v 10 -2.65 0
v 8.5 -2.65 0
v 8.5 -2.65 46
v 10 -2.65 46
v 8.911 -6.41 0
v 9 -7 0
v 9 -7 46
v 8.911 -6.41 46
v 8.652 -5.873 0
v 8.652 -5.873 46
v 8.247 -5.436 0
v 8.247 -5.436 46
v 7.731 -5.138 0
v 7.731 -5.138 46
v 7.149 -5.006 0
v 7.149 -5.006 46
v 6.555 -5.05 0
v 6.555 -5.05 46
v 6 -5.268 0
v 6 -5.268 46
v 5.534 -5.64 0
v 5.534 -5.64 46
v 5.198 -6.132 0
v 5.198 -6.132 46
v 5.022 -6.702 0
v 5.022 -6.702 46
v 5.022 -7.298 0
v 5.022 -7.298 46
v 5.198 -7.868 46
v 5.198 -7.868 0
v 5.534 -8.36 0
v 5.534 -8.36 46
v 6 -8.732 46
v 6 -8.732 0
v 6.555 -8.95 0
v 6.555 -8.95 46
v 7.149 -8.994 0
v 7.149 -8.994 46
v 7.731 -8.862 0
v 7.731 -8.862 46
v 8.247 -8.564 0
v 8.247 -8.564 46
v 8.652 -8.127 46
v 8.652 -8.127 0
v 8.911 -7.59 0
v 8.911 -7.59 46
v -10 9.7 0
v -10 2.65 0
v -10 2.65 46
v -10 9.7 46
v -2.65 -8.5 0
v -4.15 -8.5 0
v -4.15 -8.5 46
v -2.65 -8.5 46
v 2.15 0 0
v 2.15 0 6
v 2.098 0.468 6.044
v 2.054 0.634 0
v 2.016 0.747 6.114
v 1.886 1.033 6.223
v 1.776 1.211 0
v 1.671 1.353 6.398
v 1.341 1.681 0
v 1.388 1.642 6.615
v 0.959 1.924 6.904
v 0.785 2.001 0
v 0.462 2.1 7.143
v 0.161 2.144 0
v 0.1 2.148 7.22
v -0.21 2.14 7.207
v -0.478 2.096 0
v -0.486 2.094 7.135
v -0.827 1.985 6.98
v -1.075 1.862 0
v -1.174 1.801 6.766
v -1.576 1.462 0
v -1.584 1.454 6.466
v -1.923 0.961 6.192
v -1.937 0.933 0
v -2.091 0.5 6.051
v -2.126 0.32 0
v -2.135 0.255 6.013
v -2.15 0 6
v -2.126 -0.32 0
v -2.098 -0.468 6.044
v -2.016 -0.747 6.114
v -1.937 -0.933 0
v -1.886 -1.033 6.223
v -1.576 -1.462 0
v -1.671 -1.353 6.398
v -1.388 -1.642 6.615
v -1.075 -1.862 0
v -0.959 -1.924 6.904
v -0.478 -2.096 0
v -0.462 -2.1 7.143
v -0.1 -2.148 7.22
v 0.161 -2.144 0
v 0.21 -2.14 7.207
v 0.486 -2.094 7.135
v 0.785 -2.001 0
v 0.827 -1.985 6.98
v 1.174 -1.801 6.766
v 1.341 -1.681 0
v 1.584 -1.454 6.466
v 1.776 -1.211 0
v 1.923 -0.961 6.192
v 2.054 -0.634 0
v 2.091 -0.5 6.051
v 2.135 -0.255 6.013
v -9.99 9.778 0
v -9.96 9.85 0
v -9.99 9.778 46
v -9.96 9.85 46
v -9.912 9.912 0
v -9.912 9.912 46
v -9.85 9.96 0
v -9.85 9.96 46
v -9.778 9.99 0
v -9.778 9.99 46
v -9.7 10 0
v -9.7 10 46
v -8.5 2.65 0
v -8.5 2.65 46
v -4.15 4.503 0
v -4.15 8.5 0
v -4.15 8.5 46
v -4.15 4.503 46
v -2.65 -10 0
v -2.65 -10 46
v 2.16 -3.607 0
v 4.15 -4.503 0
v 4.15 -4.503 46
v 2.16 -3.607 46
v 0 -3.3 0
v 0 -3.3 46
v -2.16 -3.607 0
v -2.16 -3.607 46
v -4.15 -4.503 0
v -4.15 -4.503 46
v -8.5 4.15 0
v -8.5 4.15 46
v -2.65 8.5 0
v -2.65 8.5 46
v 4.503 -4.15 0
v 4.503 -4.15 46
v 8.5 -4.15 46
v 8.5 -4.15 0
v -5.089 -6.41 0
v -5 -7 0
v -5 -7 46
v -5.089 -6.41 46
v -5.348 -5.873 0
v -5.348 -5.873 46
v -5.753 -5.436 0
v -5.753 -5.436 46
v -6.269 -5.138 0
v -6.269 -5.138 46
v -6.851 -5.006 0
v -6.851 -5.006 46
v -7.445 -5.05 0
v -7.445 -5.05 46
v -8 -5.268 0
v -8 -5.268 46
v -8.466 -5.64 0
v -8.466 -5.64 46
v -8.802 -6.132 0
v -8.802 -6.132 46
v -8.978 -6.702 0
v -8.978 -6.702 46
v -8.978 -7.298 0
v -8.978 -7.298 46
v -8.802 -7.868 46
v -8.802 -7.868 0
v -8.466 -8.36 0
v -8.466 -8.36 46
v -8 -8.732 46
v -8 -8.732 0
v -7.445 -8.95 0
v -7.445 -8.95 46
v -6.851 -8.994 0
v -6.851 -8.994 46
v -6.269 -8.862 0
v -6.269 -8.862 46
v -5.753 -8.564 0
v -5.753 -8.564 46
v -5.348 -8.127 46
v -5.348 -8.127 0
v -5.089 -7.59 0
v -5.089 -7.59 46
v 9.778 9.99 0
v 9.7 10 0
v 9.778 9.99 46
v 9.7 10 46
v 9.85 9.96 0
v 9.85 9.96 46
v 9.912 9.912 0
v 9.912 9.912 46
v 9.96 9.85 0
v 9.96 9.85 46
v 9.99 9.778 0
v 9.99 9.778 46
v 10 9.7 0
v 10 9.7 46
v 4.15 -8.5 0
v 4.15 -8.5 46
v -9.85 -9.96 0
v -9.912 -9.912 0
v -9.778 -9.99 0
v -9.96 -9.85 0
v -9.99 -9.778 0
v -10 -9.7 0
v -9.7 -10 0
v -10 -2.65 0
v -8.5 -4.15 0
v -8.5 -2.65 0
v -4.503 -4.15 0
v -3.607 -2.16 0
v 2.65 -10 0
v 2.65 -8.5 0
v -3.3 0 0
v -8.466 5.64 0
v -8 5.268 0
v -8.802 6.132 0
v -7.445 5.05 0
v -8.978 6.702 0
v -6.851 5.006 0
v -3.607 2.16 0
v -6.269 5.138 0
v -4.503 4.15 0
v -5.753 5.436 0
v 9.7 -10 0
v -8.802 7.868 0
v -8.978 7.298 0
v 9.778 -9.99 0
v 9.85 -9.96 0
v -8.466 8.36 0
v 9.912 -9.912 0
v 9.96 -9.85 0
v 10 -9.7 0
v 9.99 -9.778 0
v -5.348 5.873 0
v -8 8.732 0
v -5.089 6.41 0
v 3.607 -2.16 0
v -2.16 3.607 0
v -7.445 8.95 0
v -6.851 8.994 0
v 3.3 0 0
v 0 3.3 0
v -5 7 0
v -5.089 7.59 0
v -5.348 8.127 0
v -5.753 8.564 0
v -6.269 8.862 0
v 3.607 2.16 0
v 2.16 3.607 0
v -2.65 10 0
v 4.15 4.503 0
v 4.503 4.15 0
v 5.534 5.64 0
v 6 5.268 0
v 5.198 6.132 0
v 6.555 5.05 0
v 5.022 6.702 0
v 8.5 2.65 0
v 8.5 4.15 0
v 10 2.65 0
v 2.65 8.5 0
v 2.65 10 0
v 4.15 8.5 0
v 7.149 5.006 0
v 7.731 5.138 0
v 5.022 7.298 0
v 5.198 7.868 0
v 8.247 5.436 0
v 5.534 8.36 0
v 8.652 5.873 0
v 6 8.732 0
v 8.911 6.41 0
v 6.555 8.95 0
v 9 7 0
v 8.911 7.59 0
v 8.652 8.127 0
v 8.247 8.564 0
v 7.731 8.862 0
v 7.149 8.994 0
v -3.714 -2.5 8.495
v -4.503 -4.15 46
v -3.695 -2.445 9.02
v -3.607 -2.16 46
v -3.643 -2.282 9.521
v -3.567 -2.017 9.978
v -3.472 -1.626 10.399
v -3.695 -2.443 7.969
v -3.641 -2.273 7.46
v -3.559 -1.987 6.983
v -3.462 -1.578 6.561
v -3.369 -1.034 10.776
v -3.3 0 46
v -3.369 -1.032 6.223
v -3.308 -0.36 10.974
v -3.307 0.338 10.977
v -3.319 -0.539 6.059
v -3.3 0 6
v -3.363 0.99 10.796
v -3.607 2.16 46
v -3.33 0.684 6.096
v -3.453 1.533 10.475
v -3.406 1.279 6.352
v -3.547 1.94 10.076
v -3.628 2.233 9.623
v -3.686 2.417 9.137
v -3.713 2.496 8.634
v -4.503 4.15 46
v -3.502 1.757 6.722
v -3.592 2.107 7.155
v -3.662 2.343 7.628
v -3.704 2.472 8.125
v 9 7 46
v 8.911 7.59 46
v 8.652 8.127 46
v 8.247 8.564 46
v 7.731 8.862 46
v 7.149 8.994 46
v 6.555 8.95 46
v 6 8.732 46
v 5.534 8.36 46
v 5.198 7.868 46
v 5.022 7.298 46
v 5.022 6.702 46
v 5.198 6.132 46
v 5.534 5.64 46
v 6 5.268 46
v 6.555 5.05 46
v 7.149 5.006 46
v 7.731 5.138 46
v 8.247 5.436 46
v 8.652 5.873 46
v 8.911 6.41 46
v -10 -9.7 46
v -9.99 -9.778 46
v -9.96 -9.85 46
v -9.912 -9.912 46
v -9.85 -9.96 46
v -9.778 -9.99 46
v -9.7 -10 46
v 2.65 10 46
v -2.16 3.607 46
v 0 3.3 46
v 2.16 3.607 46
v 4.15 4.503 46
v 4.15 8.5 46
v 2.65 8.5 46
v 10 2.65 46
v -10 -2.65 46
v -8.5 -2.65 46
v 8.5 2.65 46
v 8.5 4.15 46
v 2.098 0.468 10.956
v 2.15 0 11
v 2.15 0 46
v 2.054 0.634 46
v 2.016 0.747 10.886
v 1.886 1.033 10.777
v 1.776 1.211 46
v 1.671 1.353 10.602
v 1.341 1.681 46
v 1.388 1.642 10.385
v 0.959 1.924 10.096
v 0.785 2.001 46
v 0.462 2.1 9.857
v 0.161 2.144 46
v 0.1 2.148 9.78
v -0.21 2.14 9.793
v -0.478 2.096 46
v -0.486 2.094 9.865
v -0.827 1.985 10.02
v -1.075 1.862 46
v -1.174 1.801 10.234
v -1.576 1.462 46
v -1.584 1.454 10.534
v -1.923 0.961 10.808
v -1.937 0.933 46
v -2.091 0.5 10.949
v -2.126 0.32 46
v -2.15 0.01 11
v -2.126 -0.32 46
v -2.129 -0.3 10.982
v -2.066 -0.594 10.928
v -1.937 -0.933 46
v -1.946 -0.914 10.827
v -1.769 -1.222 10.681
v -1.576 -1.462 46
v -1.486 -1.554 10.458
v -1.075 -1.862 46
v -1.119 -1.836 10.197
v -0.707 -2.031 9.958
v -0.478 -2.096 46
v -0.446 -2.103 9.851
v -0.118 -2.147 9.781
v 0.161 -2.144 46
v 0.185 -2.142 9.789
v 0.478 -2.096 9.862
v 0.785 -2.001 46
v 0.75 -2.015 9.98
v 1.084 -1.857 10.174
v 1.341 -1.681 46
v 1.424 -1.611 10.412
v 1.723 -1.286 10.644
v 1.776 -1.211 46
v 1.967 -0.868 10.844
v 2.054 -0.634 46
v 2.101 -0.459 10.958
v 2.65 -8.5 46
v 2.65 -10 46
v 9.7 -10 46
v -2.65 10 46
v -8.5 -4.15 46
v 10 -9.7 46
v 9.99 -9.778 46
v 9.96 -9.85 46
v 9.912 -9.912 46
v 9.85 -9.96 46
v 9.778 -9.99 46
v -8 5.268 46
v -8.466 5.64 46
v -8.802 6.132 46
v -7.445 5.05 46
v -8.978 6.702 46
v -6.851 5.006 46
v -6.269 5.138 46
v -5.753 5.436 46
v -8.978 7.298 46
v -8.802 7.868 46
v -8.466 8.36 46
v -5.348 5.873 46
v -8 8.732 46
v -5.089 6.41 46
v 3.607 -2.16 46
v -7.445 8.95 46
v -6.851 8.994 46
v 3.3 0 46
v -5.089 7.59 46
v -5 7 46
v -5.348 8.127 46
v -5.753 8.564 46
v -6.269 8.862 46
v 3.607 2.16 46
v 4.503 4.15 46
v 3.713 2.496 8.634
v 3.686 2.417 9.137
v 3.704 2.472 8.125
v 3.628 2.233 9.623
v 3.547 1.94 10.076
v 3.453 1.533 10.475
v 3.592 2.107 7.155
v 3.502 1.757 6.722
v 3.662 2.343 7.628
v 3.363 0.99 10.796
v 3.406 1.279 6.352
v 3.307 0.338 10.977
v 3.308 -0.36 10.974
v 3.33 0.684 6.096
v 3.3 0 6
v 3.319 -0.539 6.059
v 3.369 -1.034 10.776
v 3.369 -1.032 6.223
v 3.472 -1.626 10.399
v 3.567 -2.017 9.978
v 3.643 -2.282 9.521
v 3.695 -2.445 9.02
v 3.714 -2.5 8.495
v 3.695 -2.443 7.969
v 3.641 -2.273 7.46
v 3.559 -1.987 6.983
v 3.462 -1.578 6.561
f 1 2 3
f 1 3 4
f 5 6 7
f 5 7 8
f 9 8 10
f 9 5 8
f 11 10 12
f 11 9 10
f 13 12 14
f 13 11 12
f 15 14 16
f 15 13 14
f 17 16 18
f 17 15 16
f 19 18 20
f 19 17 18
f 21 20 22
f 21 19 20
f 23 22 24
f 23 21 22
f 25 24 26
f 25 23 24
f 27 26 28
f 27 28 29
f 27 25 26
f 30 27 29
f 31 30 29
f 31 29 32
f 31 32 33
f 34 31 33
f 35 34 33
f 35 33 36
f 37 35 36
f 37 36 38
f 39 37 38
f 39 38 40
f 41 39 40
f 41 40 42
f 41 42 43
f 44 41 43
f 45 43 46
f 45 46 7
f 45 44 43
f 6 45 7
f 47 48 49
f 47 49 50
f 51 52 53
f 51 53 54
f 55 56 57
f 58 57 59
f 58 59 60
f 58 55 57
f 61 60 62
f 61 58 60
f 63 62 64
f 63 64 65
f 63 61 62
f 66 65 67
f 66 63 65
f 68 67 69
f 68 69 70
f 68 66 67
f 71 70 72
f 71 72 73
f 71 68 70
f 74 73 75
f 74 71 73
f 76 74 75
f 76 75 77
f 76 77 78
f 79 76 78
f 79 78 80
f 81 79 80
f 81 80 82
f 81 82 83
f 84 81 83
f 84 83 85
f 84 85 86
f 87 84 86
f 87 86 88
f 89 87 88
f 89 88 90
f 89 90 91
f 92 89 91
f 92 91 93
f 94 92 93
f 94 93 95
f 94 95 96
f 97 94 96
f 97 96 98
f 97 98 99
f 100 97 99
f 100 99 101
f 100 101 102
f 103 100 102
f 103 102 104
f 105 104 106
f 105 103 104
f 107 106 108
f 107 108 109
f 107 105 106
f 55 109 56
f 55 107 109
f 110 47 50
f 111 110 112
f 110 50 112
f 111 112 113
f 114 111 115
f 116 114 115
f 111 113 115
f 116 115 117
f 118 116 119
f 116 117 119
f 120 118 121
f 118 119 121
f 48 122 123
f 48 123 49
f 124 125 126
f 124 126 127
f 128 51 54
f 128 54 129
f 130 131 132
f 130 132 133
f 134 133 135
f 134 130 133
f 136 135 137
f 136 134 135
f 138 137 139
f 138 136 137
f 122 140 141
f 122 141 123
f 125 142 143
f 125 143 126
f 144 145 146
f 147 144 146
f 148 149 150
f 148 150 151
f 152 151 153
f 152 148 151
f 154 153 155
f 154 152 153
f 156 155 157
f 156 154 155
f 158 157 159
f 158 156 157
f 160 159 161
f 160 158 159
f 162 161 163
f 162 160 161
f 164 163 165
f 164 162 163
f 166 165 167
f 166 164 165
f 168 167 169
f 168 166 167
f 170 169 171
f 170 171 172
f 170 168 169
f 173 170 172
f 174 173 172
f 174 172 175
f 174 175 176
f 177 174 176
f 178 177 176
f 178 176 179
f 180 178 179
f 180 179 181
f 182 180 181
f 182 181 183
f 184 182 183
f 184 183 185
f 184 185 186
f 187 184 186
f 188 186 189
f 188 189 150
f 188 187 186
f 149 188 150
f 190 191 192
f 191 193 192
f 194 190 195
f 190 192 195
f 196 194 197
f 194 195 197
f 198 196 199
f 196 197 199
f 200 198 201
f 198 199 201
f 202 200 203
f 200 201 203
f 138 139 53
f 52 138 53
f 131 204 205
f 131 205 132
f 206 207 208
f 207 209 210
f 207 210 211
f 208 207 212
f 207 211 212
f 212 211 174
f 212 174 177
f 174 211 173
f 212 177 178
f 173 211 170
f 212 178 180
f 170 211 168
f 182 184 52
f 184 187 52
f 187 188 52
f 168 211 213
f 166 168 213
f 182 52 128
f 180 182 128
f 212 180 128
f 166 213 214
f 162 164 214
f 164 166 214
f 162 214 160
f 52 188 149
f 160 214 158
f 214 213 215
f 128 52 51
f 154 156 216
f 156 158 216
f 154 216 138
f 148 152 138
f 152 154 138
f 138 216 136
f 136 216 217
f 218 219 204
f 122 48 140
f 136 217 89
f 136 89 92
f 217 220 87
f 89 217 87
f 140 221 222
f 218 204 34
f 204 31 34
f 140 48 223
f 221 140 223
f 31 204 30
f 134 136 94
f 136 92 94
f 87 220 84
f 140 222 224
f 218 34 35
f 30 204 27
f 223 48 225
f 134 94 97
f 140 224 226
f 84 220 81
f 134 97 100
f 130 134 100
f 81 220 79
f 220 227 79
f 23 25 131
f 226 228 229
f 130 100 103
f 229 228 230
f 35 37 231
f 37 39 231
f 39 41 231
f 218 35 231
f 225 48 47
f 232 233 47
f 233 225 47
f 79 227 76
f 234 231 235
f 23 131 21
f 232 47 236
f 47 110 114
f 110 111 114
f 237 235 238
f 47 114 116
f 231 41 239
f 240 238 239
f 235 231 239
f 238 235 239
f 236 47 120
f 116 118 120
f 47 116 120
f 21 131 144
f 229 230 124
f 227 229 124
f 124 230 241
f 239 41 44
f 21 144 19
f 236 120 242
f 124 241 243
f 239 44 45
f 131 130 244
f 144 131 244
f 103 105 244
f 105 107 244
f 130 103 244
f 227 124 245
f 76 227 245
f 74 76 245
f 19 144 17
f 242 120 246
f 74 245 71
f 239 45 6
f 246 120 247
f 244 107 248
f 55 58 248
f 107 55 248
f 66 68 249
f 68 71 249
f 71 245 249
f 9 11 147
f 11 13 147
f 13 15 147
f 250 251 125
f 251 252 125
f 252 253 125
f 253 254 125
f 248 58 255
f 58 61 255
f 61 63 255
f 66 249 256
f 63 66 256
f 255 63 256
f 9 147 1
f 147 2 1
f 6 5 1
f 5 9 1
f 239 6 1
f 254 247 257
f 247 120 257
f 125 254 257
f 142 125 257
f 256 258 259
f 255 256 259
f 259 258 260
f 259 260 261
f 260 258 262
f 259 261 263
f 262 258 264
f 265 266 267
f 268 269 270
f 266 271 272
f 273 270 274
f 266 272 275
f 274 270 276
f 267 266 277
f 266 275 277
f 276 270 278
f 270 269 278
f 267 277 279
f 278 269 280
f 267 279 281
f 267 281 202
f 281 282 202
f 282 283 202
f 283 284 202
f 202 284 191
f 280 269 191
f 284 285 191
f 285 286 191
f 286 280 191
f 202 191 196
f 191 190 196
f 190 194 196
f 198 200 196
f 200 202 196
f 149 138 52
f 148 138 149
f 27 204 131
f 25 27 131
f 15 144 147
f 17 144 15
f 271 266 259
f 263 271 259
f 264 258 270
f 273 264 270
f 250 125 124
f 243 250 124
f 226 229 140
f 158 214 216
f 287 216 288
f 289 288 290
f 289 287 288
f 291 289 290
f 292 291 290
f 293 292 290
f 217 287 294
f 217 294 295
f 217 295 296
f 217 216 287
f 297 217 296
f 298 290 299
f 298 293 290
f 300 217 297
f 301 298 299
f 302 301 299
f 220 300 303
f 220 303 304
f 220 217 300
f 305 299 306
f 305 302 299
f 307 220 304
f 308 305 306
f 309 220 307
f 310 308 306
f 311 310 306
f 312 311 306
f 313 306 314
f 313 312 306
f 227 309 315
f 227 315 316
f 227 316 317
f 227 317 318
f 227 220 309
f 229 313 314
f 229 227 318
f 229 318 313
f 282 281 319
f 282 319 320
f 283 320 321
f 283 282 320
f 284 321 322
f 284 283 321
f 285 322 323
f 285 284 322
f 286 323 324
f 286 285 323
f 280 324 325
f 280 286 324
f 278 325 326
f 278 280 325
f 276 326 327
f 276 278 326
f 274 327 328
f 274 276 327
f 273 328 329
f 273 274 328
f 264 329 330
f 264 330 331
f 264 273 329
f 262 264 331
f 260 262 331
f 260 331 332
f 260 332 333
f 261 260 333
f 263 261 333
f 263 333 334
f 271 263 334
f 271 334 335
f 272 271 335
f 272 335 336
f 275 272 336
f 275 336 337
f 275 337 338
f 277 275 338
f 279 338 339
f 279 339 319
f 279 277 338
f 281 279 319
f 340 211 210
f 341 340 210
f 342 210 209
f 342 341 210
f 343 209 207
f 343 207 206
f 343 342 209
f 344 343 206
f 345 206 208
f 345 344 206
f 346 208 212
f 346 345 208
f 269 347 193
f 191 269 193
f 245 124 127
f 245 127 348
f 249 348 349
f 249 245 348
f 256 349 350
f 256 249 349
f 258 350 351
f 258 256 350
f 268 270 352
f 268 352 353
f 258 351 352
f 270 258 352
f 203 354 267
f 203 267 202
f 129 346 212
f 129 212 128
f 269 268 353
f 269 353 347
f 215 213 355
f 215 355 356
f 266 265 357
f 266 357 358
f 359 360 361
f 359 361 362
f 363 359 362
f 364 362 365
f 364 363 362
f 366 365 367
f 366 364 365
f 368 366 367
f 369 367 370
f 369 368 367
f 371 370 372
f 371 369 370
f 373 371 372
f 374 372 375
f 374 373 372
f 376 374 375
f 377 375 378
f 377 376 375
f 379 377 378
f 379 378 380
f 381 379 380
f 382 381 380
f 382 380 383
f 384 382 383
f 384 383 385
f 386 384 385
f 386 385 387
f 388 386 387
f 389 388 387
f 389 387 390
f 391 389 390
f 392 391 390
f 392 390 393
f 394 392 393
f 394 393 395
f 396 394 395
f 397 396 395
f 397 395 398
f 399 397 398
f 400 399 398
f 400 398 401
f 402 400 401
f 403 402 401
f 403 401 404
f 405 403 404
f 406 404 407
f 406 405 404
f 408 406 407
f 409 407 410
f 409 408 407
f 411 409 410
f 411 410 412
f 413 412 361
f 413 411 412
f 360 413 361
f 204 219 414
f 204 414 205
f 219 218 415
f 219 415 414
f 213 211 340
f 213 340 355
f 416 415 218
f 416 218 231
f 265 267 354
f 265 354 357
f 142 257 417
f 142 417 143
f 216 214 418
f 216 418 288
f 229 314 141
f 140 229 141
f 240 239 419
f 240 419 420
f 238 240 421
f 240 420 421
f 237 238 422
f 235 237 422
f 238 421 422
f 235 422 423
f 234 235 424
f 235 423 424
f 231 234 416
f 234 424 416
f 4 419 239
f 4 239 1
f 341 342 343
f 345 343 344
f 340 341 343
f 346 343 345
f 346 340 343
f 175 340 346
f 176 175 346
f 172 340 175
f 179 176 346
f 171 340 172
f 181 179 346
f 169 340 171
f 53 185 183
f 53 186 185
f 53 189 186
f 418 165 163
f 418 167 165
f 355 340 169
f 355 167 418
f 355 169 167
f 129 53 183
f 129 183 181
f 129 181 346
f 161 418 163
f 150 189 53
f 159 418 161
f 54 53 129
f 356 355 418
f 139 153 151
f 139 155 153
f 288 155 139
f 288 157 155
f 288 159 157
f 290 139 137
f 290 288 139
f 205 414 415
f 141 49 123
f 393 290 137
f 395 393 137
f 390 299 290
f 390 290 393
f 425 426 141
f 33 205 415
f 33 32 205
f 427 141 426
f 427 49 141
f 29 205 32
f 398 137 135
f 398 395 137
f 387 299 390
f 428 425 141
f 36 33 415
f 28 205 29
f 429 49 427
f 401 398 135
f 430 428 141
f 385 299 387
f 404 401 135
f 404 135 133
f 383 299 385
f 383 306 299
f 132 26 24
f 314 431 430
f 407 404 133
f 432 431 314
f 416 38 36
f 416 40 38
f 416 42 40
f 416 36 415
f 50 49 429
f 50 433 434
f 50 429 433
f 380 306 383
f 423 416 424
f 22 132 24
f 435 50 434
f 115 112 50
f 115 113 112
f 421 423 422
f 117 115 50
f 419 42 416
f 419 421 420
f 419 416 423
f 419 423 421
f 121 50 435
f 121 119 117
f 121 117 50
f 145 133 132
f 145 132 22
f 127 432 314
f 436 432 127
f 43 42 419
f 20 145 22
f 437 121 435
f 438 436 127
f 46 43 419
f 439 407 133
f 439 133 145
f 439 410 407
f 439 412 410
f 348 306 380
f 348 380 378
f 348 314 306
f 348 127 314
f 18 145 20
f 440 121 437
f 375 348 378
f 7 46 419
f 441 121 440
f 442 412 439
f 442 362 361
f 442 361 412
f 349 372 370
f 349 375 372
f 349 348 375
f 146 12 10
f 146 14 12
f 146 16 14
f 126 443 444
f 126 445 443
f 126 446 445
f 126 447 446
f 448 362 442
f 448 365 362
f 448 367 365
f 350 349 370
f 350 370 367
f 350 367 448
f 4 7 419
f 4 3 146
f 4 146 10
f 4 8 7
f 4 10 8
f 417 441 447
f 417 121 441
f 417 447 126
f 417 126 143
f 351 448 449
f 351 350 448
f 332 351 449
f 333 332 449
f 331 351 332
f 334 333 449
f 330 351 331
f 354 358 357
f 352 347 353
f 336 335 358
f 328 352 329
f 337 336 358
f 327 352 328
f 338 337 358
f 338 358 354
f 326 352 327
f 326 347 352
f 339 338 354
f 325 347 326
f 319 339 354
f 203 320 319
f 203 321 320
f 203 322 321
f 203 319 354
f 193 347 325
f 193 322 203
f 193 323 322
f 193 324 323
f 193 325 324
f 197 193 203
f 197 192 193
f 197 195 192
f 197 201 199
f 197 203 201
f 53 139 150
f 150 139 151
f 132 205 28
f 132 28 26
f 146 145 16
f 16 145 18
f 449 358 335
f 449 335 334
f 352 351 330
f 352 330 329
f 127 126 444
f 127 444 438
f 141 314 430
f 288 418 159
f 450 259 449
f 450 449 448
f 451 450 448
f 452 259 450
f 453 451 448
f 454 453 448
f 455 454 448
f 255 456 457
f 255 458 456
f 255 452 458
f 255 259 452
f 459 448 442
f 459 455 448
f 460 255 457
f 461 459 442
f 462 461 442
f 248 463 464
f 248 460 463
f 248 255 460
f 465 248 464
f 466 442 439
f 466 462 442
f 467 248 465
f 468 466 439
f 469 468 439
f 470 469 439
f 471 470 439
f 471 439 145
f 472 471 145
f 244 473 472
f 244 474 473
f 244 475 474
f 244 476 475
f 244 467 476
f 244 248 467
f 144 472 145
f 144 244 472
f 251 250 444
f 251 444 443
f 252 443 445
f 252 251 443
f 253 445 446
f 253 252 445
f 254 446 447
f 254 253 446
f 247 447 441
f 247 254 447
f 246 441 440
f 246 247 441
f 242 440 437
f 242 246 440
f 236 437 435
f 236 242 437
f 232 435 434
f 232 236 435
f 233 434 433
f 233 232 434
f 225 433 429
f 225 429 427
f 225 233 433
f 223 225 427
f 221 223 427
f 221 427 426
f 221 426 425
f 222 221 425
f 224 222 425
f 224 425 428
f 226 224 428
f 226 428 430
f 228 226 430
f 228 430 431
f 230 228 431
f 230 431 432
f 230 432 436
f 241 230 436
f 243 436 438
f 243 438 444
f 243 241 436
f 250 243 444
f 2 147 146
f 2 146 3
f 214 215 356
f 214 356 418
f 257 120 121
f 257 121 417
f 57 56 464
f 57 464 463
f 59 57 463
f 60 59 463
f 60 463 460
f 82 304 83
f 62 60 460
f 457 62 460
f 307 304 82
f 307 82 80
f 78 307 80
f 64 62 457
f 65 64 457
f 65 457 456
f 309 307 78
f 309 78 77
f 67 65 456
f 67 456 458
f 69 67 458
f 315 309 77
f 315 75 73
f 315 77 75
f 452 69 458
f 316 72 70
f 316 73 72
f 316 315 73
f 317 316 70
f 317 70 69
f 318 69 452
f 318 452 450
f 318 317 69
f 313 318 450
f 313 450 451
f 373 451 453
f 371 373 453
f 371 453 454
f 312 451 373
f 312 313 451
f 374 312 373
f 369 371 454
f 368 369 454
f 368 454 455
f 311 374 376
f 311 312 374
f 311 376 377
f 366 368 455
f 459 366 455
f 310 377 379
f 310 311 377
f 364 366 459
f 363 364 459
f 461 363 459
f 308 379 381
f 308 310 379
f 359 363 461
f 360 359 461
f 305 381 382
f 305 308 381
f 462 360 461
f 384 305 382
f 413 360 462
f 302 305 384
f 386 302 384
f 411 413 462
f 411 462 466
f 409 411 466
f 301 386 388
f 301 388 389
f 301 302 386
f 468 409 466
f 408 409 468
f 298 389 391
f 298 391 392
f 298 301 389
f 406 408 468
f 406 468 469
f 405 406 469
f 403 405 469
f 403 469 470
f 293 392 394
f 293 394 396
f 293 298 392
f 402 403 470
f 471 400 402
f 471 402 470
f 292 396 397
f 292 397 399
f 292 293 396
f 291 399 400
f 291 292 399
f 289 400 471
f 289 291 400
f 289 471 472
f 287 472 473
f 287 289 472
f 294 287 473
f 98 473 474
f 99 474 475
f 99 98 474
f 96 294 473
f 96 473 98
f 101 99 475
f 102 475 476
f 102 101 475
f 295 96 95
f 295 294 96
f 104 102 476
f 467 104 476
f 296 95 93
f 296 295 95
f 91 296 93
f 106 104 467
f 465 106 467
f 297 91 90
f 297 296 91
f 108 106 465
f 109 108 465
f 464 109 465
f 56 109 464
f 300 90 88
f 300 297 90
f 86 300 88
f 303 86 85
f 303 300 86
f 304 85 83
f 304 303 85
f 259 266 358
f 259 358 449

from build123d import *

# Parameters (mm, degrees)
SKETCH_1_W               = 20
SKETCH_1_H               = 20
SKETCH_1_R               = 2
SKETCH_1_R_2             = 2.15
EXTRUDE_1_DEPTH          = 46
CUT_EXTRUDE_1_REACH      = 50.125
PATTERN_CIRCULAR_1_COUNT = 4
FILLET_1_R               = 0.3
CUT_EXTRUDE_2_DEPTH      = 49.124837662
CUT_EXTRUDE_2_DEPTH_BACK = 49.124837662
SKETCH_2_R               = 2.5


with BuildPart() as part:
    # 스케치1 → 보스-돌출1 (new body)
    with BuildSketch(Plane.XY):
        Rectangle(SKETCH_1_W, SKETCH_1_H)
        with Locations((-7, -7)):
            Circle(SKETCH_1_R, mode=Mode.SUBTRACT)
        with Locations((7, -7)):
            Circle(SKETCH_1_R, mode=Mode.SUBTRACT)
        with Locations((-7, 7)):
            Circle(SKETCH_1_R, mode=Mode.SUBTRACT)
        Circle(SKETCH_1_R_2, mode=Mode.SUBTRACT)
        with Locations((7, 7)):
            Circle(SKETCH_1_R, mode=Mode.SUBTRACT)
    extrude(amount=EXTRUDE_1_DEPTH)

    # 스케치1<3> → 컷-돌출1 (cut, up to next)
    with BuildSketch(Plane.XY, mode=Mode.PRIVATE) as cut_extrude_1_sk1:
        with BuildLine():
            Line((-8.5, 2.65), (-10, 2.65))
            Line((-10, 2.65), (-10, -2.65))
            Line((-10, -2.65), (-8.5, -2.65))
            Line((-8.5, -2.65), (-8.5, -4.15))
            Line((-8.5, -4.15), (-4.503166667, -4.15))
            ThreePointArc((-4.503166667, -4.15), (-3.3, 0), (-4.503166667, 4.15))
            Line((-4.503166667, 4.15), (-8.5, 4.15))
            Line((-8.5, 4.15), (-8.5, 2.65))
        make_face()
    cut_extrude_1_tool1 = extrude(cut_extrude_1_sk1.sketch, amount=CUT_EXTRUDE_1_REACH, mode=Mode.PRIVATE) & part.part
    cut_extrude_1 = cut_extrude_1_tool1.solids().sort_by_distance((-6.606913, 0, 0))[0]
    add(cut_extrude_1, mode=Mode.SUBTRACT)

    # 원형 패턴1: 컷-돌출1 ×4 about axis
    pattern_circular_1_axis = Axis((0, 0, 46), (0, 0, -1))
    for i in range(1, PATTERN_CIRCULAR_1_COUNT):
        add(cut_extrude_1.rotate(pattern_circular_1_axis, i * 360 / PATTERN_CIRCULAR_1_COUNT), mode=Mode.SUBTRACT)

    # 필렛1
    fillet_1_edges = [part.edges().sort_by_distance(p)[0] for p in [
        (10, -10, 23),
        (-10, -10, 23),
        (-10, 10, 23),
        (10, 10, 23),
    ]]
    fillet(fillet_1_edges, radius=FILLET_1_R)

    # 스케치2 → 컷-돌출2 (cut, two sides: drawn at the far end of the back side and taken through both)
    with BuildSketch(Plane(origin=(0, 0, 0), x_dir=(0, 0, -1), z_dir=(1, 0, 0)).offset(-CUT_EXTRUDE_2_DEPTH_BACK)):
        with Locations((-8.5, 0)):
            Circle(SKETCH_2_R)
    extrude(amount=CUT_EXTRUDE_2_DEPTH + CUT_EXTRUDE_2_DEPTH_BACK, mode=Mode.SUBTRACT)


solid = part.part
